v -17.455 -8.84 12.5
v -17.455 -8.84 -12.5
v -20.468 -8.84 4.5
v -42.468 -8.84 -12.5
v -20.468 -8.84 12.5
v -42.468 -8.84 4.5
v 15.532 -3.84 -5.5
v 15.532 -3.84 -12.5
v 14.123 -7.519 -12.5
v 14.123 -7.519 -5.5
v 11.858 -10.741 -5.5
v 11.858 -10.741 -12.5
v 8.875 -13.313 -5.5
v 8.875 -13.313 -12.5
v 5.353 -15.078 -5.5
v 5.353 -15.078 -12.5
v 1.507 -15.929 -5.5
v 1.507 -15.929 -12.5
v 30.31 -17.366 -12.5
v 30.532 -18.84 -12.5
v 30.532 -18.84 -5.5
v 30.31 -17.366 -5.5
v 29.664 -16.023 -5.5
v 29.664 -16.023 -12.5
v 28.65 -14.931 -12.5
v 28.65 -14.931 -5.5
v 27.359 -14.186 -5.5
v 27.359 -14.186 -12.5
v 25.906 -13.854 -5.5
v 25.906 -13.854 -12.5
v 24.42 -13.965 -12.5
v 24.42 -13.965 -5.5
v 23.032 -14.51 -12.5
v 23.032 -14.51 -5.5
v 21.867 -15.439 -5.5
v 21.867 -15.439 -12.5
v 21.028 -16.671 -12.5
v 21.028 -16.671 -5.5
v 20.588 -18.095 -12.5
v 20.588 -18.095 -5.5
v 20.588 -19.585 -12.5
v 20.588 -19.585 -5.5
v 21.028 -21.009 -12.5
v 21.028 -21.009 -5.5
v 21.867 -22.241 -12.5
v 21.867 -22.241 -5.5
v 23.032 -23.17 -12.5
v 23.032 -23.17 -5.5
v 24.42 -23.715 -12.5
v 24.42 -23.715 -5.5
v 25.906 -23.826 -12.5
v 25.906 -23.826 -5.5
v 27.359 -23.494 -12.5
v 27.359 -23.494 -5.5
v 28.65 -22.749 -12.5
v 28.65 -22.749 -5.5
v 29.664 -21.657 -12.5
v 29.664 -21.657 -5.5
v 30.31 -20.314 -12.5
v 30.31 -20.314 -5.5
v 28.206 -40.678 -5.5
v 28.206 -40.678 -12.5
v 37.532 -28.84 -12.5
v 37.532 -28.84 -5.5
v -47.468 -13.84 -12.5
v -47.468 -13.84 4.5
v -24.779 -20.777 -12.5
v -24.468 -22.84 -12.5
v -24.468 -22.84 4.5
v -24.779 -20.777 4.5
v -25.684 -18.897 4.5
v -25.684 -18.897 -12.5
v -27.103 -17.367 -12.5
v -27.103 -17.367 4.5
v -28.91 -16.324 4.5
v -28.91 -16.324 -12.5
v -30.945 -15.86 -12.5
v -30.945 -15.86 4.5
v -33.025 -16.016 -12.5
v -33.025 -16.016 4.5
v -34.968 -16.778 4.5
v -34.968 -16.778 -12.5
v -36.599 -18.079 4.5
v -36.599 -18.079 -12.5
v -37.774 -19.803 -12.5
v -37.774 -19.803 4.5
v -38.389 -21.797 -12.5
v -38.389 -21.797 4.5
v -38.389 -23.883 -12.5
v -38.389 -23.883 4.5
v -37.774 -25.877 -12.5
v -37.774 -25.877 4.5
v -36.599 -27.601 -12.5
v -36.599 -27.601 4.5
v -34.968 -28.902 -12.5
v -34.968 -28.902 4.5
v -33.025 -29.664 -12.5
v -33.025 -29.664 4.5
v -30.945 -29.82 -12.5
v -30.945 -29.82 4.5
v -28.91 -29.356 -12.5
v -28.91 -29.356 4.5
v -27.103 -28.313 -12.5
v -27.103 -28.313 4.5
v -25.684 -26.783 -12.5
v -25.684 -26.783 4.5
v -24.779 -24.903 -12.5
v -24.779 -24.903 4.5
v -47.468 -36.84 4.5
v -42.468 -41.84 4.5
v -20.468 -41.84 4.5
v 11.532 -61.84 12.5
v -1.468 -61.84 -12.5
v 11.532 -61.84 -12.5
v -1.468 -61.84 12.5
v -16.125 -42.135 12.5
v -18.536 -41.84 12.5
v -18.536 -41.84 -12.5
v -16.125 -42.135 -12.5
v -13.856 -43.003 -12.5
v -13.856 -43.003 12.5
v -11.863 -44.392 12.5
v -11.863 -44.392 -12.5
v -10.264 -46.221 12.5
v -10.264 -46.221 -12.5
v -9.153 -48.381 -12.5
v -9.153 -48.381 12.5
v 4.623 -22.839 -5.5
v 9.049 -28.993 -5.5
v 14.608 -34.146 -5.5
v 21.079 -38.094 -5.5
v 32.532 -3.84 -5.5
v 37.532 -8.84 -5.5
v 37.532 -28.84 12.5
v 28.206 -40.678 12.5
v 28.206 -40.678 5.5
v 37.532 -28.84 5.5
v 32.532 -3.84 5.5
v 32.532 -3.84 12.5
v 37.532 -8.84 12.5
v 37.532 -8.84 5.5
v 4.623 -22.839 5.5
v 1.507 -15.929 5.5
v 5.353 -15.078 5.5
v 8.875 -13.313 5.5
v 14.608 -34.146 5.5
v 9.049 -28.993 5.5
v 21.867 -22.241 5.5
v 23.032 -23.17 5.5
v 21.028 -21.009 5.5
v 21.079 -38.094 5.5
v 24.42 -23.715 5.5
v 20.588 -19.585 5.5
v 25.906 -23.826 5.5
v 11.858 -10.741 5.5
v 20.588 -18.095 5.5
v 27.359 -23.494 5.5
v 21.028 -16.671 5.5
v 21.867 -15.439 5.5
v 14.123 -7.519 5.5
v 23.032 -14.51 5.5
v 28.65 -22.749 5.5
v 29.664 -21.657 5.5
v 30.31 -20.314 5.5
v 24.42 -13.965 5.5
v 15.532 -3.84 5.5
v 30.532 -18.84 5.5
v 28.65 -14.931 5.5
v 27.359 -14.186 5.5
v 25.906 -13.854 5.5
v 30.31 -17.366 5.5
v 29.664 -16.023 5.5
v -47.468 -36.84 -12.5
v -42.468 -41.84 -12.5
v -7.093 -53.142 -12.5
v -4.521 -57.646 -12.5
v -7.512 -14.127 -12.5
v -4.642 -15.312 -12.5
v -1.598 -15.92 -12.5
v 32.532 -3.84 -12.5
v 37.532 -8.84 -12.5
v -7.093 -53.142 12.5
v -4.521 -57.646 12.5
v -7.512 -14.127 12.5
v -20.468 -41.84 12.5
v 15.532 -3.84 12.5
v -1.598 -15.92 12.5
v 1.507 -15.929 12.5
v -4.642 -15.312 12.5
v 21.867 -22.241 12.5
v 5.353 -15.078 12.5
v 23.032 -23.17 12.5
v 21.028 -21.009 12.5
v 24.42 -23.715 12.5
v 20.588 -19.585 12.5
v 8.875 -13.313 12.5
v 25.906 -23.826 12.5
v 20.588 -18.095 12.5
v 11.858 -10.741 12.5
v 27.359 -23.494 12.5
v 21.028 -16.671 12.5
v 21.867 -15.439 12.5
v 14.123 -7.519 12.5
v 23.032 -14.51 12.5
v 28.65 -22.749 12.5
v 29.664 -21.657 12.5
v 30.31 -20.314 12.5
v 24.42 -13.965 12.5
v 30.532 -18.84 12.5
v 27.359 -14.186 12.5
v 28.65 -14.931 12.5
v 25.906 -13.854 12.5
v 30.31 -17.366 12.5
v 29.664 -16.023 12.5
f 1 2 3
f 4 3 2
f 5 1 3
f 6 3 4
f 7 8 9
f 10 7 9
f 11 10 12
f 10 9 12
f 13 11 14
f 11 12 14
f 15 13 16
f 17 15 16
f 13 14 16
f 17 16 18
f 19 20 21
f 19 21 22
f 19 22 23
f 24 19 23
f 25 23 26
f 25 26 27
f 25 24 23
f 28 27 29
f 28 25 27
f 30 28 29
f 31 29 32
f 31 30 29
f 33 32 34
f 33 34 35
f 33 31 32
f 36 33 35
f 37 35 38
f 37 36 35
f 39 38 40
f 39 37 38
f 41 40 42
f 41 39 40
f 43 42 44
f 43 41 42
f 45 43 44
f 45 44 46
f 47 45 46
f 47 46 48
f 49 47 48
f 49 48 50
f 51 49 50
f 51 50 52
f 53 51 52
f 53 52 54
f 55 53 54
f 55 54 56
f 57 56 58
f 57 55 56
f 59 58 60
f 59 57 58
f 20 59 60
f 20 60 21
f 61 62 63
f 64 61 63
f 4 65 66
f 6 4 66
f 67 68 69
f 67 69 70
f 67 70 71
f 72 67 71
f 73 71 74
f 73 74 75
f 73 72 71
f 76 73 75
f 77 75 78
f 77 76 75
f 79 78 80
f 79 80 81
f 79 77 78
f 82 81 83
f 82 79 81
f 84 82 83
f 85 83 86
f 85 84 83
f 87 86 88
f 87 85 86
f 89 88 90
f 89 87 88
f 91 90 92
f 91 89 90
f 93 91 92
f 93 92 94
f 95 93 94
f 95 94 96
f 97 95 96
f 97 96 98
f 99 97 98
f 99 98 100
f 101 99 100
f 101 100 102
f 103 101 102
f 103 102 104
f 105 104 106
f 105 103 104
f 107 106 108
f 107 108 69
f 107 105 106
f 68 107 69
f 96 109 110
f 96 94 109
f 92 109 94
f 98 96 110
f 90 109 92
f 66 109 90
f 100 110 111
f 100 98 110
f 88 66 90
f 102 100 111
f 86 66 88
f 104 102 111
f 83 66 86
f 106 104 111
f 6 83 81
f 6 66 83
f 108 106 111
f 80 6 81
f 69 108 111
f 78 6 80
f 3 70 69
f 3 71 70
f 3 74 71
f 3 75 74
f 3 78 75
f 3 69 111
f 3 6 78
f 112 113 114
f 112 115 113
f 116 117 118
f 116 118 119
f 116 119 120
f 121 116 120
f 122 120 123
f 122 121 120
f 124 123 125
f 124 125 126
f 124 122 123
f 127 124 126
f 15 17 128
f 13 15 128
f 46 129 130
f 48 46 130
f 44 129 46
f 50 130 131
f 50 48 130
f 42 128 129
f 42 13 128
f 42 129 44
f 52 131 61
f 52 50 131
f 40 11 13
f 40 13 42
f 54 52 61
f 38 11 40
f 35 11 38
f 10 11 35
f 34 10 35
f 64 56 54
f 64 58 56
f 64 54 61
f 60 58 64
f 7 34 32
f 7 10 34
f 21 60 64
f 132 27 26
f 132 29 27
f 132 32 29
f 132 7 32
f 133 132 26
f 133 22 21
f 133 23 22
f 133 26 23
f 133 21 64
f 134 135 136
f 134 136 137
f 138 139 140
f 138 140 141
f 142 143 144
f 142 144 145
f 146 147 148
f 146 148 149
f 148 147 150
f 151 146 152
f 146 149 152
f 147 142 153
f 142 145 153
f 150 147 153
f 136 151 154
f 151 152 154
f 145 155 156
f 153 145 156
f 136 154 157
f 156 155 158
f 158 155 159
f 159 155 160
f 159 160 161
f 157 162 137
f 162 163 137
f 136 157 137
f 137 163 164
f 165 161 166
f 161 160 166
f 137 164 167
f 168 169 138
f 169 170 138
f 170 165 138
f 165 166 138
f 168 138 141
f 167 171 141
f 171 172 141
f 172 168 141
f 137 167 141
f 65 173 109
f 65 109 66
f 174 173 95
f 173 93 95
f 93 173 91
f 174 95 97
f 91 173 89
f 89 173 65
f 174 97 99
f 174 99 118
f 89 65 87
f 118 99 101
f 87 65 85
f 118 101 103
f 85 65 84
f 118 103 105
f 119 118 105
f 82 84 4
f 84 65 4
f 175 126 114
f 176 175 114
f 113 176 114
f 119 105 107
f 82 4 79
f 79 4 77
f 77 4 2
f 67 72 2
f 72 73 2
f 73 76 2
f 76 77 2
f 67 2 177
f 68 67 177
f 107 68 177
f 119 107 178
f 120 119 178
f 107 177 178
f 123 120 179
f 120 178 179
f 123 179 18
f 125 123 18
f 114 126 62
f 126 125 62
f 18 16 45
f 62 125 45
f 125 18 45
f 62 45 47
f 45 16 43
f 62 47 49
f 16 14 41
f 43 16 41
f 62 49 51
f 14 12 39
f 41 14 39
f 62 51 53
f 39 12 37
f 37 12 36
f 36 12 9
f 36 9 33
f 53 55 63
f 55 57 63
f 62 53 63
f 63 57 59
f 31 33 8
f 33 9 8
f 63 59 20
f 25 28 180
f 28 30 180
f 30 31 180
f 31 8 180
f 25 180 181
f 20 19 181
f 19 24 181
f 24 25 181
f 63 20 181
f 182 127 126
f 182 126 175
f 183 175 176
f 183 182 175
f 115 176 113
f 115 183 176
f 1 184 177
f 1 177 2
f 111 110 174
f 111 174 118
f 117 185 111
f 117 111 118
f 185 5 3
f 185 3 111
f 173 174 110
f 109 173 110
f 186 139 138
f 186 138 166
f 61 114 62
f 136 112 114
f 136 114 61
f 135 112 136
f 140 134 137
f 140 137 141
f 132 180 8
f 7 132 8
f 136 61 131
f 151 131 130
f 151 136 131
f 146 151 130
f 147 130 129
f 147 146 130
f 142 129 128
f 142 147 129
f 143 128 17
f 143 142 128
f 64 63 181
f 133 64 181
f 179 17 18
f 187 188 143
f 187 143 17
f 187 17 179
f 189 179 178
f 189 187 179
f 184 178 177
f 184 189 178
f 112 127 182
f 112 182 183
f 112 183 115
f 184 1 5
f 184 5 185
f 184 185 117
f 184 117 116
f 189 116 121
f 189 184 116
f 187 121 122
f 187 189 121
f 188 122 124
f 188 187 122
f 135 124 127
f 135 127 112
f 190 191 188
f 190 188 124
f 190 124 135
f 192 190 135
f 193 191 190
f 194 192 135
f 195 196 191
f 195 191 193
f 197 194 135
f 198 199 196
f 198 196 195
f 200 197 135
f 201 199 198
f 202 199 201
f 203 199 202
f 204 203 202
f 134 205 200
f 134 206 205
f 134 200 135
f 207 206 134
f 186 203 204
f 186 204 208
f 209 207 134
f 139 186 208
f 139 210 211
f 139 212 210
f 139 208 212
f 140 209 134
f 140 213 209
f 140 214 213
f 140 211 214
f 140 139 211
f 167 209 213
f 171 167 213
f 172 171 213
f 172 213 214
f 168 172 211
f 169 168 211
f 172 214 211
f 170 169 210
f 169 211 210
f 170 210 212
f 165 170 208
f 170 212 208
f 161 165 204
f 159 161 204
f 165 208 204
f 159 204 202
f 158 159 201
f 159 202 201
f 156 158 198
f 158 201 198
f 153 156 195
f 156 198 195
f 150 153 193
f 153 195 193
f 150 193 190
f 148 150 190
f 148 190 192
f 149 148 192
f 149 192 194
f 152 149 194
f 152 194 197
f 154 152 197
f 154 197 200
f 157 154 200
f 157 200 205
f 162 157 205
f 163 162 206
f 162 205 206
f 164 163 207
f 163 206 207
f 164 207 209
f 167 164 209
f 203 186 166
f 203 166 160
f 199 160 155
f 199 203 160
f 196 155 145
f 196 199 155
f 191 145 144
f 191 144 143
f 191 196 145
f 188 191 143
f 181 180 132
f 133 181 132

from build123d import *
from build123d.topology import SkipClean

# Parameters (mm, degrees)
BOSS_EXTRUDE1_START = -12.5
SKETCH1_W           = 27
SKETCH1_H           = 33
SKETCH1_R           = 7
BOSS_EXTRUDE1_DEPTH = 17
BOSS_EXTRUDE3_DEPTH = 12.5
BOSS_EXTRUDE4_START = 12.5
SKETCH1_5_R         = 5
BOSS_EXTRUDE4_DEPTH = 7
CHAMFER1_SIZE       = 5


with BuildPart() as part:
    # Sketch1 → Boss-Extrude1 (new body)
    with BuildSketch(Plane.XY.offset(BOSS_EXTRUDE1_START)):
        with Locations((-33.967633793, -25.34)):
            Rectangle(SKETCH1_W, SKETCH1_H)
        with Locations((-31.467633793, -22.84)):
            Circle(SKETCH1_R, mode=Mode.SUBTRACT)
    extrude(amount=BOSS_EXTRUDE1_DEPTH)

    # Sketch1<4> → Boss-Extrude3 (add, symmetric)
    with BuildSketch(Plane.XY):
        with BuildLine():
            ThreePointArc((28.205719919, -40.677666444), (11.699513519, -31.708687123), (1.506567213, -15.928912557))
            ThreePointArc((1.506567213, -15.928912557), (-3.134727468, -15.689916625), (-7.511545005, -14.127161486))
            Line((-7.511545005, -14.127161486), (-17.455249537, -8.84))
            Line((-17.455249537, -8.84), (-20.467633793, -8.84))
            Line((-20.467633793, -8.84), (-20.467633793, -41.84))
            Line((-20.467633793, -41.84), (-18.535800645, -41.84))
            ThreePointArc((-18.535800645, -41.84), (-12.817002571, -43.63662578), (-9.153112508, -48.38093028))
            ThreePointArc((-9.153112508, -48.38093028), (-5.868981967, -55.429445297), (-1.467633793, -61.84))
            Line((-1.467633793, -61.84), (11.532366207, -61.84))
            Line((11.532366207, -61.84), (28.205719919, -40.677666444))
        make_face()
    extrude(amount=BOSS_EXTRUDE3_DEPTH, both=True)

    # Sketch1<5> → Boss-Extrude4 (add)
    with BuildSketch(Plane.XY.offset(BOSS_EXTRUDE4_START)):
        with BuildLine():
            Line((37.532366207, -3.84), (15.532366207, -3.84))
            ThreePointArc((15.532366207, -3.84), (10.445897028, -12.1195394), (1.506567213, -15.928912557))
            ThreePointArc((1.506567213, -15.928912557), (11.699513519, -31.708687123), (28.205719919, -40.677666444))
            Line((28.205719919, -40.677666444), (37.532366207, -28.84))
            Line((37.532366207, -28.84), (37.532366207, -3.84))
        make_face()
        with Locations((25.532366207, -18.84)):
            Circle(SKETCH1_5_R, mode=Mode.SUBTRACT)
    boss_extrude4 = extrude(amount=-BOSS_EXTRUDE4_DEPTH)

    # Mirror1: Boss-Extrude4 across plane
    with SkipClean():  # the faces are left unmerged after this step: merging them gives an invalid solid
        add(boss_extrude4.mirror(Plane.XY))

    # Chamfer1
    chamfer1_edges = [part.edges().sort_by_distance(p)[0] for p in [
        (-47.467633793, -41.84, -4),
        (-47.467633793, -8.84, -4),
        (37.532366207, -3.84, 9),
        (37.532366207, -3.84, -9),
    ]]
    chamfer(chamfer1_edges, length=CHAMFER1_SIZE)


solid = part.part
